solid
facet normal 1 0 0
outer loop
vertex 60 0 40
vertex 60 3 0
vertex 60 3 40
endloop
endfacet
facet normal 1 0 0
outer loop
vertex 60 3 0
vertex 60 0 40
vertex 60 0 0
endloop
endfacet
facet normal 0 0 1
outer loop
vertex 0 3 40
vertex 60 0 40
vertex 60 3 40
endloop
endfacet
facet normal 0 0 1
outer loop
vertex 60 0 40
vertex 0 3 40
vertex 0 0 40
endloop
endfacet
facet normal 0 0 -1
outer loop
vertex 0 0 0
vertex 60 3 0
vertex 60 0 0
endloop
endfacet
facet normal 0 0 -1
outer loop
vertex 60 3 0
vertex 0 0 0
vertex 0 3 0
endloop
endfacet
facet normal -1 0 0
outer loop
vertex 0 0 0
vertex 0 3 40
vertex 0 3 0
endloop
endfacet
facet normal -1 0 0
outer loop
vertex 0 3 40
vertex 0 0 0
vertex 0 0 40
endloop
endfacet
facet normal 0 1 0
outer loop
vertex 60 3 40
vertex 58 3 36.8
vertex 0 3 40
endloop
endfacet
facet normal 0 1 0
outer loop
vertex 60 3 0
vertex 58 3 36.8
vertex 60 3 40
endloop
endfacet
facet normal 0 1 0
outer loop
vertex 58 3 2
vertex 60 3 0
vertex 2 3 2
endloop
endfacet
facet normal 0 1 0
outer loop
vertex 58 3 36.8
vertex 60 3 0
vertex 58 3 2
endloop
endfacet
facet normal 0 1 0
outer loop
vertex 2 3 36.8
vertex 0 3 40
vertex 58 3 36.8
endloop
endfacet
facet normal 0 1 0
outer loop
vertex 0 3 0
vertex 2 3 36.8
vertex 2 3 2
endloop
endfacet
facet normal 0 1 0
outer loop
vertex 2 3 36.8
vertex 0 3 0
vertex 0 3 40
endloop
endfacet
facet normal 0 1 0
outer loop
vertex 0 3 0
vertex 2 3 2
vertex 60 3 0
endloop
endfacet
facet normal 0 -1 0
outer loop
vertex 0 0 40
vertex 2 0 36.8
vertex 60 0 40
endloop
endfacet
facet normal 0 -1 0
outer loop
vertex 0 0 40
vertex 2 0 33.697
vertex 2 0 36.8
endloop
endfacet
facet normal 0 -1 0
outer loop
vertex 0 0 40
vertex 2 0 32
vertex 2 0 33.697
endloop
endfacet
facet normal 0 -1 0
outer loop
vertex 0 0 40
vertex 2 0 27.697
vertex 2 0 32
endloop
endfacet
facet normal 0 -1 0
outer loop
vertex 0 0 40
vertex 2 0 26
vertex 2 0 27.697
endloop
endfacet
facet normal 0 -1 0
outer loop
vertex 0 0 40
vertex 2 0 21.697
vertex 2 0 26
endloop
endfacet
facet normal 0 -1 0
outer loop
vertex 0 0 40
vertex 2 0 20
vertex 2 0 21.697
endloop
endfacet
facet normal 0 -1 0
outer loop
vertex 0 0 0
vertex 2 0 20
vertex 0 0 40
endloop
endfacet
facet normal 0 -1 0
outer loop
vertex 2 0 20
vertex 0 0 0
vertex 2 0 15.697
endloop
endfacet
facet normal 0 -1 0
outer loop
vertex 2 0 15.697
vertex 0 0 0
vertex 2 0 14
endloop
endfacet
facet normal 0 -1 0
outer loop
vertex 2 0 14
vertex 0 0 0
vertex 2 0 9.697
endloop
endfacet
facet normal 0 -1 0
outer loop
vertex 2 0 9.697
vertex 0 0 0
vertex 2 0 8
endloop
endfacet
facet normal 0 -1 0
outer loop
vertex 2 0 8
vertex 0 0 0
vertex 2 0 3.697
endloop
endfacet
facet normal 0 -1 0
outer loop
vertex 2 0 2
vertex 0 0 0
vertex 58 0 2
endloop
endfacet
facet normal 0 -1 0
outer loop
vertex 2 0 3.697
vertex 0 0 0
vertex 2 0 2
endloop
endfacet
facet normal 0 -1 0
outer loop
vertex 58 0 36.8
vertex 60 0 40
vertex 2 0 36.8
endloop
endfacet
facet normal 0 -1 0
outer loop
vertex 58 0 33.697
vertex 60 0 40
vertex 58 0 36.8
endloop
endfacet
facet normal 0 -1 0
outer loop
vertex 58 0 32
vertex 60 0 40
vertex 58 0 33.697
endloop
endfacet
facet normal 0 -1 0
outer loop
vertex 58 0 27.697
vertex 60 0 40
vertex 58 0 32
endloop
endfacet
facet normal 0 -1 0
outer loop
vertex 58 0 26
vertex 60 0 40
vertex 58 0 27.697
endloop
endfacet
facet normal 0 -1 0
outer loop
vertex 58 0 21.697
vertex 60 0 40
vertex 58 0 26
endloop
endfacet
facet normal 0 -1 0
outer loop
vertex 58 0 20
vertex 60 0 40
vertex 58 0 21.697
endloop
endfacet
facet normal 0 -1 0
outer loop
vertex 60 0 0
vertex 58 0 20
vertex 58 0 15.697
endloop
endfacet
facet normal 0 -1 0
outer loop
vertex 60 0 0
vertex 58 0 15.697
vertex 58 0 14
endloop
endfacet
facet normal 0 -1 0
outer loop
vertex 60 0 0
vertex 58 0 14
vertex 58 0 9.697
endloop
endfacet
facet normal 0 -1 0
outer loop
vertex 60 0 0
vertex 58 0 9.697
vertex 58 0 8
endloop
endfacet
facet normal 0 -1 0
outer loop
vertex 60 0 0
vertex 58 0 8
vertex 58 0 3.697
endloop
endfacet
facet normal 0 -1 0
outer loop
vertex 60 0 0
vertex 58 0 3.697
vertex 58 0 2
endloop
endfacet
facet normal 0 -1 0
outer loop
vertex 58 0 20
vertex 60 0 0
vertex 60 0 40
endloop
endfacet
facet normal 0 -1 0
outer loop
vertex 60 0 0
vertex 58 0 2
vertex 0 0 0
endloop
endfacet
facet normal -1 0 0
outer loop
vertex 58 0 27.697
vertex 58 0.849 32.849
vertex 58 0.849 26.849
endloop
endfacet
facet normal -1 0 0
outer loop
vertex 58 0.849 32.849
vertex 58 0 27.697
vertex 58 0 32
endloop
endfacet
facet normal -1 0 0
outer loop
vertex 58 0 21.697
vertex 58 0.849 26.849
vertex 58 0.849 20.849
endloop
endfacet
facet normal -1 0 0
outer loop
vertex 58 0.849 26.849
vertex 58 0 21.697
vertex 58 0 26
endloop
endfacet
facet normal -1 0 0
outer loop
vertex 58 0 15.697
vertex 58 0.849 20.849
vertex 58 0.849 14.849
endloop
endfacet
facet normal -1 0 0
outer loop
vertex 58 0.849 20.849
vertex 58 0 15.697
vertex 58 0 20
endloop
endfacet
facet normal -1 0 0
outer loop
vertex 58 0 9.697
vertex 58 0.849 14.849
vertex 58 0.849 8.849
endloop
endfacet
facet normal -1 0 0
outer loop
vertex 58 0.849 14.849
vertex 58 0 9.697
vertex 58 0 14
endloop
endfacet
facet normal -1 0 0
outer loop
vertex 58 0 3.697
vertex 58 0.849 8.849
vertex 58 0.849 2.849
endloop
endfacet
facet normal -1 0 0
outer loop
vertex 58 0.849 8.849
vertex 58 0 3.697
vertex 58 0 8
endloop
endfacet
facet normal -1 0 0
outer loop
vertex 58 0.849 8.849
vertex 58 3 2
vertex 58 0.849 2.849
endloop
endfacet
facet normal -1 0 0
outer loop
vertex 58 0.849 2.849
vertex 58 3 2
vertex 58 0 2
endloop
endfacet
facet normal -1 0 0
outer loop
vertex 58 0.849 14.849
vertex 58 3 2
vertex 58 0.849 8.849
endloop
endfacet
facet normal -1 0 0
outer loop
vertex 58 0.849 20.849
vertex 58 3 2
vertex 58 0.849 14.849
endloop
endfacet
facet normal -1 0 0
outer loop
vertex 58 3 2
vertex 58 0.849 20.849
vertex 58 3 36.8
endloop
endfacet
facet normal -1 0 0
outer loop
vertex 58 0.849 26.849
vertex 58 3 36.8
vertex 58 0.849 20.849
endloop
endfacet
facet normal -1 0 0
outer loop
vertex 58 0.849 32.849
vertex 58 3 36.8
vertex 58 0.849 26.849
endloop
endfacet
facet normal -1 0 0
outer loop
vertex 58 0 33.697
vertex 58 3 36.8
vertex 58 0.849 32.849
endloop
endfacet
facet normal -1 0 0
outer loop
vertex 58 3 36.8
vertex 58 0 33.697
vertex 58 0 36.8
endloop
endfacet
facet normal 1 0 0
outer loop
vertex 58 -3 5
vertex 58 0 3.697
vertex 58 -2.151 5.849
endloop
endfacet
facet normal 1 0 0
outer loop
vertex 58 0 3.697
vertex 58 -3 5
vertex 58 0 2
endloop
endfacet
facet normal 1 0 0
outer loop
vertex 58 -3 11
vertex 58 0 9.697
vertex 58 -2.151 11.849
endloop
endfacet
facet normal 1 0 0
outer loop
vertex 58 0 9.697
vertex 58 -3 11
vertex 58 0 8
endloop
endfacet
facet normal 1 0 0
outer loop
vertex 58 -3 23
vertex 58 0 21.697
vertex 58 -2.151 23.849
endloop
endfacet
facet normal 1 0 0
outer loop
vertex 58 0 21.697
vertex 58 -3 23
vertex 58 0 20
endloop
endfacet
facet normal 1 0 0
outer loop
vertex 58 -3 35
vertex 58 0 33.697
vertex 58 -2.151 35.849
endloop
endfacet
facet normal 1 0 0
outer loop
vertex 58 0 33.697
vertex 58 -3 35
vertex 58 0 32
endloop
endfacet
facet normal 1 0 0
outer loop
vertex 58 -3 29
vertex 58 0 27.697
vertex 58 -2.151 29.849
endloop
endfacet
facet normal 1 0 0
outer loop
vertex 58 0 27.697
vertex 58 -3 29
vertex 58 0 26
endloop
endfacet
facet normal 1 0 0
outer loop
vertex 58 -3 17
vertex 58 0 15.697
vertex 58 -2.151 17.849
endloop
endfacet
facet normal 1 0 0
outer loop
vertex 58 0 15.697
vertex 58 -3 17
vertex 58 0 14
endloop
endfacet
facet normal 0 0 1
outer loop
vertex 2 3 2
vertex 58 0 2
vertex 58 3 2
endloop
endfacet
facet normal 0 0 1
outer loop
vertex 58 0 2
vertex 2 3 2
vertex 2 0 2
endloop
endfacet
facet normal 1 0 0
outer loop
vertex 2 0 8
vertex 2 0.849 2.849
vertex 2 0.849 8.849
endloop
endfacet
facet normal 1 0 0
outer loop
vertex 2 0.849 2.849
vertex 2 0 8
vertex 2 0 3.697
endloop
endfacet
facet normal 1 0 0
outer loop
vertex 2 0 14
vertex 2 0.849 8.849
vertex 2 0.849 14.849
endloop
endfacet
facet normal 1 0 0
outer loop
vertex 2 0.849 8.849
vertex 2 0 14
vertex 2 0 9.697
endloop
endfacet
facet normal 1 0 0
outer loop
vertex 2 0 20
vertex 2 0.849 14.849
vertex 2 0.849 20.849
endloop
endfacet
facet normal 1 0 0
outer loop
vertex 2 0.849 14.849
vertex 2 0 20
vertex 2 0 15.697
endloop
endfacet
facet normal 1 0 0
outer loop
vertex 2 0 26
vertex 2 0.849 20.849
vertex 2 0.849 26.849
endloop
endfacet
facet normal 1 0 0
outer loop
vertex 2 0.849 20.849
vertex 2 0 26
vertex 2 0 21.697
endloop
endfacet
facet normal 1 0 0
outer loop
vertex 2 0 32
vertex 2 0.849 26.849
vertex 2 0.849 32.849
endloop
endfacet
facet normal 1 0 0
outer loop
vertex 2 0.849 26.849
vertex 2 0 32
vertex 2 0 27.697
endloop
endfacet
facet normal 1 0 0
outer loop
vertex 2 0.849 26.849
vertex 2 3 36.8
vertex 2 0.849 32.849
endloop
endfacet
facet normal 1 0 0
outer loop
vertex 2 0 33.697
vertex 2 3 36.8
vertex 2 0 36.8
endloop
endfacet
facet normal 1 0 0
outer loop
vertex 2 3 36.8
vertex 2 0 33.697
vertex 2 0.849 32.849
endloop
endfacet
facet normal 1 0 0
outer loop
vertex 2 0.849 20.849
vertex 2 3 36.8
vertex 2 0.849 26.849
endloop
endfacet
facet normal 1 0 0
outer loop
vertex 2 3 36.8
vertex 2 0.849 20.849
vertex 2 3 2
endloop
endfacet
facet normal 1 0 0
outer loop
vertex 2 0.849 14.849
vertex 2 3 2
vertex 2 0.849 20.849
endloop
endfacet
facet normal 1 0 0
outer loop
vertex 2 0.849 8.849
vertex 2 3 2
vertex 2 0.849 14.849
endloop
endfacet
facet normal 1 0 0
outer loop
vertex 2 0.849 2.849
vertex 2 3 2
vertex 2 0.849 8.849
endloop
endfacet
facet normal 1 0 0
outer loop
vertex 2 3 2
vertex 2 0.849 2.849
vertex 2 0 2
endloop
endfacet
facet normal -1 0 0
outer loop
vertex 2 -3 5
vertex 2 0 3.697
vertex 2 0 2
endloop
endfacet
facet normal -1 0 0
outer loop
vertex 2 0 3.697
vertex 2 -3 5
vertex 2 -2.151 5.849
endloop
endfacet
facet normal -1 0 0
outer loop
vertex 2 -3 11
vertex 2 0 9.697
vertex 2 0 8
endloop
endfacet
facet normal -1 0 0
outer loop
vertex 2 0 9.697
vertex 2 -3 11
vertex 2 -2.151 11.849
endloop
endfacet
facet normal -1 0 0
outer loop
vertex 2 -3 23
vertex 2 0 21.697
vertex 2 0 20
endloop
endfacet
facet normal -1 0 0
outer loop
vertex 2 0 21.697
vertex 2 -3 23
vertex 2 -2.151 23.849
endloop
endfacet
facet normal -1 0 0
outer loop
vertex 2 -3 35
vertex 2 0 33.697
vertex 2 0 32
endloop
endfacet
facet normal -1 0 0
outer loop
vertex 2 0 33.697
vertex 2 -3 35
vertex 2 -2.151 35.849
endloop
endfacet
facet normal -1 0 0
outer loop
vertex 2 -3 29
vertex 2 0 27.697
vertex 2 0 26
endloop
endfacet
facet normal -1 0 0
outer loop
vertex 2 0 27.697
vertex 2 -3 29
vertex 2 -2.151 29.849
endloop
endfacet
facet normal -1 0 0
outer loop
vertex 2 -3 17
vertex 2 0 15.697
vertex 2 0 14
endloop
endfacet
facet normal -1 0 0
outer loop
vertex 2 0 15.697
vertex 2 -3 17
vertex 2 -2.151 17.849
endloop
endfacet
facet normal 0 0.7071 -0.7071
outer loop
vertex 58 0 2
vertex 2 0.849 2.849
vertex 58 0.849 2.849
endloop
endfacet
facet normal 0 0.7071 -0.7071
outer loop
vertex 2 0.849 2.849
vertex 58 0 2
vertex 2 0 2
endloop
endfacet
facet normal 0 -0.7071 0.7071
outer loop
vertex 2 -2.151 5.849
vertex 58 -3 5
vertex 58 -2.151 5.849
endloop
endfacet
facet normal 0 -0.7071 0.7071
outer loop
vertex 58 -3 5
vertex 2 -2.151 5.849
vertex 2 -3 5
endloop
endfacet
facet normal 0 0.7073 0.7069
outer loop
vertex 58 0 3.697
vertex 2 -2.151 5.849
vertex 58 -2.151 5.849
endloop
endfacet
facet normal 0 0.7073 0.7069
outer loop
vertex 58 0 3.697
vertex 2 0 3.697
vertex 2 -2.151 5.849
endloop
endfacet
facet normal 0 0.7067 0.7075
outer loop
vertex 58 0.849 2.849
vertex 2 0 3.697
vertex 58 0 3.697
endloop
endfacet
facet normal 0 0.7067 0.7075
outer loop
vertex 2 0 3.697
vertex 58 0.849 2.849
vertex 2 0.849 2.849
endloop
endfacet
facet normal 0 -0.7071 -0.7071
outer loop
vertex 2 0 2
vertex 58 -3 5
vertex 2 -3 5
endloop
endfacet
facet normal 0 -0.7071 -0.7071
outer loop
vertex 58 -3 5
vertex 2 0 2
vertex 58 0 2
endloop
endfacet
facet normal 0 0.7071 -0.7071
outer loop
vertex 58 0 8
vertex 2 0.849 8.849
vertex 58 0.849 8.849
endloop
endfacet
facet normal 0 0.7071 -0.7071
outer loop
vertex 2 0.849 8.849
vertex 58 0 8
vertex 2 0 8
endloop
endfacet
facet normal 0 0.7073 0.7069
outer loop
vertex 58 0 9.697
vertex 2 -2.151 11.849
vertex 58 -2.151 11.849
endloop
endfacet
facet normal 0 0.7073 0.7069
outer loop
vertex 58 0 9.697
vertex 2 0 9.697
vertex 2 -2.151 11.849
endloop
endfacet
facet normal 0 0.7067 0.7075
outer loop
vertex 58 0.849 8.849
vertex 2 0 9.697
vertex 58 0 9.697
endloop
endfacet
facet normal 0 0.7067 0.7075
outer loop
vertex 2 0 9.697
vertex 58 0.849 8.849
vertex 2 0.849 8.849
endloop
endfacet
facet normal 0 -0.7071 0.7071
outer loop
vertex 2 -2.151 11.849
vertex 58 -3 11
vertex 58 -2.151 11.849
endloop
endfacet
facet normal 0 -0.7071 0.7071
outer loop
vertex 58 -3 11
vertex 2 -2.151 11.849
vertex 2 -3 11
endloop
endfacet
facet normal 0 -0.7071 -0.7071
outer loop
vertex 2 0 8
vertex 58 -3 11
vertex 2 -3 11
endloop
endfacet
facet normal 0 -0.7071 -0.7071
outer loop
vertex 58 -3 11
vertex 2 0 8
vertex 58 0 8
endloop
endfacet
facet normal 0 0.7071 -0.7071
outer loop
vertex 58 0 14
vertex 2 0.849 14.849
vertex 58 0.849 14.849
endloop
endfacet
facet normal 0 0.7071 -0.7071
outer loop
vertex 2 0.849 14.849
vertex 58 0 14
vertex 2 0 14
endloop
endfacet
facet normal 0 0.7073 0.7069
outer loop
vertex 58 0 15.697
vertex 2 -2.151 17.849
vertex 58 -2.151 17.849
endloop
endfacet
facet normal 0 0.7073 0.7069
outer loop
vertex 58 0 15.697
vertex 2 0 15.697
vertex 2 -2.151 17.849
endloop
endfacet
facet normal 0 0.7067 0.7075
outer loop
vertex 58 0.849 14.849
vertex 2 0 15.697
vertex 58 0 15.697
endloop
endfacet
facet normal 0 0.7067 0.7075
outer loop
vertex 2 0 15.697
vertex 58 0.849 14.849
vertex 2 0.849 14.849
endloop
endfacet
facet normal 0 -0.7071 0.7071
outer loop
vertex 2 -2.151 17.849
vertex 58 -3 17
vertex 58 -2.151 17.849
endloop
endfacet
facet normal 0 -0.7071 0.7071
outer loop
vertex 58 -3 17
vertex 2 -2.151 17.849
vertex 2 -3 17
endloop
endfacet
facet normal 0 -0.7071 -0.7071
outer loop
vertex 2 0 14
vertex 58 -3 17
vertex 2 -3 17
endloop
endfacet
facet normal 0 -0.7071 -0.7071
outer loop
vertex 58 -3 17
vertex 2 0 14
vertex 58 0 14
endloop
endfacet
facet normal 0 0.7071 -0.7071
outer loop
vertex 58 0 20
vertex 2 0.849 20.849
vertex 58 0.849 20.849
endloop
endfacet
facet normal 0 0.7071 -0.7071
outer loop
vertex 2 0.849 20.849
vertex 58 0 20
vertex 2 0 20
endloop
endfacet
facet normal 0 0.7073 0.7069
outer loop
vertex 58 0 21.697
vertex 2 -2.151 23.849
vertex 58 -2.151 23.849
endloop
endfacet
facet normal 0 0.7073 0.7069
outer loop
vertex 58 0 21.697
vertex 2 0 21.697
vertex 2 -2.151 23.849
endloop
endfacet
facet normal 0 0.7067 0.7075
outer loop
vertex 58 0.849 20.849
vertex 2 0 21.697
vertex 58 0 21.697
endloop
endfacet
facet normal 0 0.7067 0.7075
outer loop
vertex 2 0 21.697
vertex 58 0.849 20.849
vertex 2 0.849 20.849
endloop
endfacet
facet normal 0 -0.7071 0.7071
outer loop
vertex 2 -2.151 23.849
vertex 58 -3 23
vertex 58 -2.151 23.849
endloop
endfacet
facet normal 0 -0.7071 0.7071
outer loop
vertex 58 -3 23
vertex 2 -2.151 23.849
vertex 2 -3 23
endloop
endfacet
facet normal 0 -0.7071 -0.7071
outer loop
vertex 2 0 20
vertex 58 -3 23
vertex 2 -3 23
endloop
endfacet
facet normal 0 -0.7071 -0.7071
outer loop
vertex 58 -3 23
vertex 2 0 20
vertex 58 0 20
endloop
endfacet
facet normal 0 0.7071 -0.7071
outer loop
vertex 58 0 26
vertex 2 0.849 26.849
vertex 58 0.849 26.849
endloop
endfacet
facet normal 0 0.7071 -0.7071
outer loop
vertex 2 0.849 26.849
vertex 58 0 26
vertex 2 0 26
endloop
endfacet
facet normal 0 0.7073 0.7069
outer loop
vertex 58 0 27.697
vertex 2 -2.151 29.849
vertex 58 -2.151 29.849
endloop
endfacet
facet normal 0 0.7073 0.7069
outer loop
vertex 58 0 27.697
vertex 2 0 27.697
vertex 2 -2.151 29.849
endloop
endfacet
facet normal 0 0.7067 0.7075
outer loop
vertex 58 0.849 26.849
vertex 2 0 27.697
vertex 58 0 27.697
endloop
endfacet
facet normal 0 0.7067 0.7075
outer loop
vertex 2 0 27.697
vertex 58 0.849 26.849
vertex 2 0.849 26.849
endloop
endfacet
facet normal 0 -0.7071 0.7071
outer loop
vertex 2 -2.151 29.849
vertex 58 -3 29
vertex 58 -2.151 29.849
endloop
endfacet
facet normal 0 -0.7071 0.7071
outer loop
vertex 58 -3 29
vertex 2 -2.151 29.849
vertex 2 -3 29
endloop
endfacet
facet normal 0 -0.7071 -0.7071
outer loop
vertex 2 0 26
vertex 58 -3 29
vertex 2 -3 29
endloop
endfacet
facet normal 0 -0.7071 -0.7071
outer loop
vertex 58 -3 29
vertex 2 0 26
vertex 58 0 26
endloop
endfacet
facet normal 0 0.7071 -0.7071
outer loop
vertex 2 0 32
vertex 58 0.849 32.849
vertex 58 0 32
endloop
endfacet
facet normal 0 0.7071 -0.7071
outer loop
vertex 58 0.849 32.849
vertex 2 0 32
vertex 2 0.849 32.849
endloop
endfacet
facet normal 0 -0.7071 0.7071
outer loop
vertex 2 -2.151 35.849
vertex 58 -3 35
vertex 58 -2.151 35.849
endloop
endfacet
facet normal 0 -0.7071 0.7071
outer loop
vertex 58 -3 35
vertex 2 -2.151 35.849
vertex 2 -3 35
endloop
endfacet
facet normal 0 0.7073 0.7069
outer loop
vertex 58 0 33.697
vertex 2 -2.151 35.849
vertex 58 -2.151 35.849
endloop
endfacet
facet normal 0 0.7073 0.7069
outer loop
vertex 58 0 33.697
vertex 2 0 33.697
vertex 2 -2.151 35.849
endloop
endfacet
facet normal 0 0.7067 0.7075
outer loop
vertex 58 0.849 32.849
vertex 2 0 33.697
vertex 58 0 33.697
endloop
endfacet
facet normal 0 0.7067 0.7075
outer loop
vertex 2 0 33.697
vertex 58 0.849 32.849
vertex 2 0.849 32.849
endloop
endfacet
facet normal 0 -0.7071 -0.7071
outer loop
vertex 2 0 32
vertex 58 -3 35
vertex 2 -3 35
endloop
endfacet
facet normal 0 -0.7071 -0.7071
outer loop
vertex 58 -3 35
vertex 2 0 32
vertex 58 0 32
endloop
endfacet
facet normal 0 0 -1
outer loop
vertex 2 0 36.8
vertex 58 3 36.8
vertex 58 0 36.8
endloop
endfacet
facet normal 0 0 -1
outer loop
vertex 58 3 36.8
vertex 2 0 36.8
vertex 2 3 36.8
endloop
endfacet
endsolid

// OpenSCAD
// =============================================================================
// FestivAir Haven Node — Rain-Baffled Louver Vent Module
// =============================================================================
// Parametric angled louver vents that allow airflow while deflecting rain.
// Louvers are oriented at 45 degrees (printable without supports when the
// vent panel is part of a vertical wall printed upright).
// =============================================================================

// Default parameters
default_vent_w        = 60;     // Total vent opening width
default_vent_h        = 40;     // Total vent opening height
default_louver_count  = 6;      // Number of louver slats
default_louver_angle  = 45;     // Louver tilt angle (degrees)
default_louver_t      = 1.2;    // Louver slat thickness
default_wall_t        = 3;      // Surrounding wall thickness (depth of louver)
default_frame_w       = 2;      // Frame border around vent opening

// --------------------------------------------------------------------------
// Single louver slat — angled blade that spans the vent width
// Oriented so rain drips down the outer face; air passes through gaps.
// --------------------------------------------------------------------------
module louver_slat(width, depth, thickness, angle) {
    // The slat is a thin rectangle rotated by `angle` around its bottom edge.
    // At 45 degrees with depth = wall thickness, the slat just reaches
    // from front to back of the wall, creating an overlapping rain baffle.
    rotate([angle, 0, 0])
        cube([width, thickness, depth / cos(angle)]);
}

// --------------------------------------------------------------------------
// Louver vent panel — cut into a wall of given thickness
// origin = bottom-left of the outer vent frame
//
// Parameters:
//   w           — vent opening width (X)
//   h           — vent opening height (Z)
//   wall_t      — wall / louver depth (Y)
//   count       — number of louver slats
//   angle       — louver tilt (degrees, 0 = horizontal / closed)
//   slat_t      — slat material thickness
//   frame       — border frame width around the opening
// --------------------------------------------------------------------------
module louver_vent(w        = default_vent_w,
                   h        = default_vent_h,
                   wall_t   = default_wall_t,
                   count    = default_louver_count,
                   angle    = default_louver_angle,
                   slat_t   = default_louver_t,
                   frame    = default_frame_w) {

    // Derived
    opening_w = w - frame * 2;
    opening_h = h - frame * 2;
    pitch     = opening_h / count;    // Vertical pitch between slats

    union() {
        // --- Outer frame (solid border) ---
        difference() {
            cube([w, wall_t, h]);
            translate([frame, -0.1, frame])
                cube([opening_w, wall_t + 0.2, opening_h]);
        }

        // --- Louver slats ---
        for (i = [0 : count - 1]) {
            translate([frame, 0, frame + i * pitch])
                louver_slat(opening_w, wall_t, slat_t, angle);
        }

        // --- Top closing slat (prevents rain entry at top) ---
        translate([frame, 0, frame + count * pitch - slat_t])
            cube([opening_w, wall_t, slat_t]);
    }
}

// --------------------------------------------------------------------------
// Vent cutout tool — use this to subtract the vent opening from the wall,
// then union the louver_vent panel back in.  This is the "negative" shape.
// --------------------------------------------------------------------------
module louver_vent_cutout(w     = default_vent_w,
                          h     = default_vent_h,
                          wall_t = default_wall_t,
                          frame = default_frame_w) {
    // Slightly oversized for clean boolean subtraction
    translate([frame, -0.1, frame])
        cube([w - frame * 2, wall_t + 0.2, h - frame * 2]);
}

// --------------------------------------------------------------------------
// Combined convenience module: cuts the hole and fills with louvers
// Use inside a difference() on the wall, then union() this after.
// Or just place this; it includes its own frame.
// --------------------------------------------------------------------------
module vent_assembly(w       = default_vent_w,
                     h       = default_vent_h,
                     wall_t  = default_wall_t,
                     count   = default_louver_count,
                     angle   = default_louver_angle,
                     slat_t  = default_louver_t,
                     frame   = default_frame_w) {
    louver_vent(w, h, wall_t, count, angle, slat_t, frame);
}

// Preview when opened directly
vent_assembly();
